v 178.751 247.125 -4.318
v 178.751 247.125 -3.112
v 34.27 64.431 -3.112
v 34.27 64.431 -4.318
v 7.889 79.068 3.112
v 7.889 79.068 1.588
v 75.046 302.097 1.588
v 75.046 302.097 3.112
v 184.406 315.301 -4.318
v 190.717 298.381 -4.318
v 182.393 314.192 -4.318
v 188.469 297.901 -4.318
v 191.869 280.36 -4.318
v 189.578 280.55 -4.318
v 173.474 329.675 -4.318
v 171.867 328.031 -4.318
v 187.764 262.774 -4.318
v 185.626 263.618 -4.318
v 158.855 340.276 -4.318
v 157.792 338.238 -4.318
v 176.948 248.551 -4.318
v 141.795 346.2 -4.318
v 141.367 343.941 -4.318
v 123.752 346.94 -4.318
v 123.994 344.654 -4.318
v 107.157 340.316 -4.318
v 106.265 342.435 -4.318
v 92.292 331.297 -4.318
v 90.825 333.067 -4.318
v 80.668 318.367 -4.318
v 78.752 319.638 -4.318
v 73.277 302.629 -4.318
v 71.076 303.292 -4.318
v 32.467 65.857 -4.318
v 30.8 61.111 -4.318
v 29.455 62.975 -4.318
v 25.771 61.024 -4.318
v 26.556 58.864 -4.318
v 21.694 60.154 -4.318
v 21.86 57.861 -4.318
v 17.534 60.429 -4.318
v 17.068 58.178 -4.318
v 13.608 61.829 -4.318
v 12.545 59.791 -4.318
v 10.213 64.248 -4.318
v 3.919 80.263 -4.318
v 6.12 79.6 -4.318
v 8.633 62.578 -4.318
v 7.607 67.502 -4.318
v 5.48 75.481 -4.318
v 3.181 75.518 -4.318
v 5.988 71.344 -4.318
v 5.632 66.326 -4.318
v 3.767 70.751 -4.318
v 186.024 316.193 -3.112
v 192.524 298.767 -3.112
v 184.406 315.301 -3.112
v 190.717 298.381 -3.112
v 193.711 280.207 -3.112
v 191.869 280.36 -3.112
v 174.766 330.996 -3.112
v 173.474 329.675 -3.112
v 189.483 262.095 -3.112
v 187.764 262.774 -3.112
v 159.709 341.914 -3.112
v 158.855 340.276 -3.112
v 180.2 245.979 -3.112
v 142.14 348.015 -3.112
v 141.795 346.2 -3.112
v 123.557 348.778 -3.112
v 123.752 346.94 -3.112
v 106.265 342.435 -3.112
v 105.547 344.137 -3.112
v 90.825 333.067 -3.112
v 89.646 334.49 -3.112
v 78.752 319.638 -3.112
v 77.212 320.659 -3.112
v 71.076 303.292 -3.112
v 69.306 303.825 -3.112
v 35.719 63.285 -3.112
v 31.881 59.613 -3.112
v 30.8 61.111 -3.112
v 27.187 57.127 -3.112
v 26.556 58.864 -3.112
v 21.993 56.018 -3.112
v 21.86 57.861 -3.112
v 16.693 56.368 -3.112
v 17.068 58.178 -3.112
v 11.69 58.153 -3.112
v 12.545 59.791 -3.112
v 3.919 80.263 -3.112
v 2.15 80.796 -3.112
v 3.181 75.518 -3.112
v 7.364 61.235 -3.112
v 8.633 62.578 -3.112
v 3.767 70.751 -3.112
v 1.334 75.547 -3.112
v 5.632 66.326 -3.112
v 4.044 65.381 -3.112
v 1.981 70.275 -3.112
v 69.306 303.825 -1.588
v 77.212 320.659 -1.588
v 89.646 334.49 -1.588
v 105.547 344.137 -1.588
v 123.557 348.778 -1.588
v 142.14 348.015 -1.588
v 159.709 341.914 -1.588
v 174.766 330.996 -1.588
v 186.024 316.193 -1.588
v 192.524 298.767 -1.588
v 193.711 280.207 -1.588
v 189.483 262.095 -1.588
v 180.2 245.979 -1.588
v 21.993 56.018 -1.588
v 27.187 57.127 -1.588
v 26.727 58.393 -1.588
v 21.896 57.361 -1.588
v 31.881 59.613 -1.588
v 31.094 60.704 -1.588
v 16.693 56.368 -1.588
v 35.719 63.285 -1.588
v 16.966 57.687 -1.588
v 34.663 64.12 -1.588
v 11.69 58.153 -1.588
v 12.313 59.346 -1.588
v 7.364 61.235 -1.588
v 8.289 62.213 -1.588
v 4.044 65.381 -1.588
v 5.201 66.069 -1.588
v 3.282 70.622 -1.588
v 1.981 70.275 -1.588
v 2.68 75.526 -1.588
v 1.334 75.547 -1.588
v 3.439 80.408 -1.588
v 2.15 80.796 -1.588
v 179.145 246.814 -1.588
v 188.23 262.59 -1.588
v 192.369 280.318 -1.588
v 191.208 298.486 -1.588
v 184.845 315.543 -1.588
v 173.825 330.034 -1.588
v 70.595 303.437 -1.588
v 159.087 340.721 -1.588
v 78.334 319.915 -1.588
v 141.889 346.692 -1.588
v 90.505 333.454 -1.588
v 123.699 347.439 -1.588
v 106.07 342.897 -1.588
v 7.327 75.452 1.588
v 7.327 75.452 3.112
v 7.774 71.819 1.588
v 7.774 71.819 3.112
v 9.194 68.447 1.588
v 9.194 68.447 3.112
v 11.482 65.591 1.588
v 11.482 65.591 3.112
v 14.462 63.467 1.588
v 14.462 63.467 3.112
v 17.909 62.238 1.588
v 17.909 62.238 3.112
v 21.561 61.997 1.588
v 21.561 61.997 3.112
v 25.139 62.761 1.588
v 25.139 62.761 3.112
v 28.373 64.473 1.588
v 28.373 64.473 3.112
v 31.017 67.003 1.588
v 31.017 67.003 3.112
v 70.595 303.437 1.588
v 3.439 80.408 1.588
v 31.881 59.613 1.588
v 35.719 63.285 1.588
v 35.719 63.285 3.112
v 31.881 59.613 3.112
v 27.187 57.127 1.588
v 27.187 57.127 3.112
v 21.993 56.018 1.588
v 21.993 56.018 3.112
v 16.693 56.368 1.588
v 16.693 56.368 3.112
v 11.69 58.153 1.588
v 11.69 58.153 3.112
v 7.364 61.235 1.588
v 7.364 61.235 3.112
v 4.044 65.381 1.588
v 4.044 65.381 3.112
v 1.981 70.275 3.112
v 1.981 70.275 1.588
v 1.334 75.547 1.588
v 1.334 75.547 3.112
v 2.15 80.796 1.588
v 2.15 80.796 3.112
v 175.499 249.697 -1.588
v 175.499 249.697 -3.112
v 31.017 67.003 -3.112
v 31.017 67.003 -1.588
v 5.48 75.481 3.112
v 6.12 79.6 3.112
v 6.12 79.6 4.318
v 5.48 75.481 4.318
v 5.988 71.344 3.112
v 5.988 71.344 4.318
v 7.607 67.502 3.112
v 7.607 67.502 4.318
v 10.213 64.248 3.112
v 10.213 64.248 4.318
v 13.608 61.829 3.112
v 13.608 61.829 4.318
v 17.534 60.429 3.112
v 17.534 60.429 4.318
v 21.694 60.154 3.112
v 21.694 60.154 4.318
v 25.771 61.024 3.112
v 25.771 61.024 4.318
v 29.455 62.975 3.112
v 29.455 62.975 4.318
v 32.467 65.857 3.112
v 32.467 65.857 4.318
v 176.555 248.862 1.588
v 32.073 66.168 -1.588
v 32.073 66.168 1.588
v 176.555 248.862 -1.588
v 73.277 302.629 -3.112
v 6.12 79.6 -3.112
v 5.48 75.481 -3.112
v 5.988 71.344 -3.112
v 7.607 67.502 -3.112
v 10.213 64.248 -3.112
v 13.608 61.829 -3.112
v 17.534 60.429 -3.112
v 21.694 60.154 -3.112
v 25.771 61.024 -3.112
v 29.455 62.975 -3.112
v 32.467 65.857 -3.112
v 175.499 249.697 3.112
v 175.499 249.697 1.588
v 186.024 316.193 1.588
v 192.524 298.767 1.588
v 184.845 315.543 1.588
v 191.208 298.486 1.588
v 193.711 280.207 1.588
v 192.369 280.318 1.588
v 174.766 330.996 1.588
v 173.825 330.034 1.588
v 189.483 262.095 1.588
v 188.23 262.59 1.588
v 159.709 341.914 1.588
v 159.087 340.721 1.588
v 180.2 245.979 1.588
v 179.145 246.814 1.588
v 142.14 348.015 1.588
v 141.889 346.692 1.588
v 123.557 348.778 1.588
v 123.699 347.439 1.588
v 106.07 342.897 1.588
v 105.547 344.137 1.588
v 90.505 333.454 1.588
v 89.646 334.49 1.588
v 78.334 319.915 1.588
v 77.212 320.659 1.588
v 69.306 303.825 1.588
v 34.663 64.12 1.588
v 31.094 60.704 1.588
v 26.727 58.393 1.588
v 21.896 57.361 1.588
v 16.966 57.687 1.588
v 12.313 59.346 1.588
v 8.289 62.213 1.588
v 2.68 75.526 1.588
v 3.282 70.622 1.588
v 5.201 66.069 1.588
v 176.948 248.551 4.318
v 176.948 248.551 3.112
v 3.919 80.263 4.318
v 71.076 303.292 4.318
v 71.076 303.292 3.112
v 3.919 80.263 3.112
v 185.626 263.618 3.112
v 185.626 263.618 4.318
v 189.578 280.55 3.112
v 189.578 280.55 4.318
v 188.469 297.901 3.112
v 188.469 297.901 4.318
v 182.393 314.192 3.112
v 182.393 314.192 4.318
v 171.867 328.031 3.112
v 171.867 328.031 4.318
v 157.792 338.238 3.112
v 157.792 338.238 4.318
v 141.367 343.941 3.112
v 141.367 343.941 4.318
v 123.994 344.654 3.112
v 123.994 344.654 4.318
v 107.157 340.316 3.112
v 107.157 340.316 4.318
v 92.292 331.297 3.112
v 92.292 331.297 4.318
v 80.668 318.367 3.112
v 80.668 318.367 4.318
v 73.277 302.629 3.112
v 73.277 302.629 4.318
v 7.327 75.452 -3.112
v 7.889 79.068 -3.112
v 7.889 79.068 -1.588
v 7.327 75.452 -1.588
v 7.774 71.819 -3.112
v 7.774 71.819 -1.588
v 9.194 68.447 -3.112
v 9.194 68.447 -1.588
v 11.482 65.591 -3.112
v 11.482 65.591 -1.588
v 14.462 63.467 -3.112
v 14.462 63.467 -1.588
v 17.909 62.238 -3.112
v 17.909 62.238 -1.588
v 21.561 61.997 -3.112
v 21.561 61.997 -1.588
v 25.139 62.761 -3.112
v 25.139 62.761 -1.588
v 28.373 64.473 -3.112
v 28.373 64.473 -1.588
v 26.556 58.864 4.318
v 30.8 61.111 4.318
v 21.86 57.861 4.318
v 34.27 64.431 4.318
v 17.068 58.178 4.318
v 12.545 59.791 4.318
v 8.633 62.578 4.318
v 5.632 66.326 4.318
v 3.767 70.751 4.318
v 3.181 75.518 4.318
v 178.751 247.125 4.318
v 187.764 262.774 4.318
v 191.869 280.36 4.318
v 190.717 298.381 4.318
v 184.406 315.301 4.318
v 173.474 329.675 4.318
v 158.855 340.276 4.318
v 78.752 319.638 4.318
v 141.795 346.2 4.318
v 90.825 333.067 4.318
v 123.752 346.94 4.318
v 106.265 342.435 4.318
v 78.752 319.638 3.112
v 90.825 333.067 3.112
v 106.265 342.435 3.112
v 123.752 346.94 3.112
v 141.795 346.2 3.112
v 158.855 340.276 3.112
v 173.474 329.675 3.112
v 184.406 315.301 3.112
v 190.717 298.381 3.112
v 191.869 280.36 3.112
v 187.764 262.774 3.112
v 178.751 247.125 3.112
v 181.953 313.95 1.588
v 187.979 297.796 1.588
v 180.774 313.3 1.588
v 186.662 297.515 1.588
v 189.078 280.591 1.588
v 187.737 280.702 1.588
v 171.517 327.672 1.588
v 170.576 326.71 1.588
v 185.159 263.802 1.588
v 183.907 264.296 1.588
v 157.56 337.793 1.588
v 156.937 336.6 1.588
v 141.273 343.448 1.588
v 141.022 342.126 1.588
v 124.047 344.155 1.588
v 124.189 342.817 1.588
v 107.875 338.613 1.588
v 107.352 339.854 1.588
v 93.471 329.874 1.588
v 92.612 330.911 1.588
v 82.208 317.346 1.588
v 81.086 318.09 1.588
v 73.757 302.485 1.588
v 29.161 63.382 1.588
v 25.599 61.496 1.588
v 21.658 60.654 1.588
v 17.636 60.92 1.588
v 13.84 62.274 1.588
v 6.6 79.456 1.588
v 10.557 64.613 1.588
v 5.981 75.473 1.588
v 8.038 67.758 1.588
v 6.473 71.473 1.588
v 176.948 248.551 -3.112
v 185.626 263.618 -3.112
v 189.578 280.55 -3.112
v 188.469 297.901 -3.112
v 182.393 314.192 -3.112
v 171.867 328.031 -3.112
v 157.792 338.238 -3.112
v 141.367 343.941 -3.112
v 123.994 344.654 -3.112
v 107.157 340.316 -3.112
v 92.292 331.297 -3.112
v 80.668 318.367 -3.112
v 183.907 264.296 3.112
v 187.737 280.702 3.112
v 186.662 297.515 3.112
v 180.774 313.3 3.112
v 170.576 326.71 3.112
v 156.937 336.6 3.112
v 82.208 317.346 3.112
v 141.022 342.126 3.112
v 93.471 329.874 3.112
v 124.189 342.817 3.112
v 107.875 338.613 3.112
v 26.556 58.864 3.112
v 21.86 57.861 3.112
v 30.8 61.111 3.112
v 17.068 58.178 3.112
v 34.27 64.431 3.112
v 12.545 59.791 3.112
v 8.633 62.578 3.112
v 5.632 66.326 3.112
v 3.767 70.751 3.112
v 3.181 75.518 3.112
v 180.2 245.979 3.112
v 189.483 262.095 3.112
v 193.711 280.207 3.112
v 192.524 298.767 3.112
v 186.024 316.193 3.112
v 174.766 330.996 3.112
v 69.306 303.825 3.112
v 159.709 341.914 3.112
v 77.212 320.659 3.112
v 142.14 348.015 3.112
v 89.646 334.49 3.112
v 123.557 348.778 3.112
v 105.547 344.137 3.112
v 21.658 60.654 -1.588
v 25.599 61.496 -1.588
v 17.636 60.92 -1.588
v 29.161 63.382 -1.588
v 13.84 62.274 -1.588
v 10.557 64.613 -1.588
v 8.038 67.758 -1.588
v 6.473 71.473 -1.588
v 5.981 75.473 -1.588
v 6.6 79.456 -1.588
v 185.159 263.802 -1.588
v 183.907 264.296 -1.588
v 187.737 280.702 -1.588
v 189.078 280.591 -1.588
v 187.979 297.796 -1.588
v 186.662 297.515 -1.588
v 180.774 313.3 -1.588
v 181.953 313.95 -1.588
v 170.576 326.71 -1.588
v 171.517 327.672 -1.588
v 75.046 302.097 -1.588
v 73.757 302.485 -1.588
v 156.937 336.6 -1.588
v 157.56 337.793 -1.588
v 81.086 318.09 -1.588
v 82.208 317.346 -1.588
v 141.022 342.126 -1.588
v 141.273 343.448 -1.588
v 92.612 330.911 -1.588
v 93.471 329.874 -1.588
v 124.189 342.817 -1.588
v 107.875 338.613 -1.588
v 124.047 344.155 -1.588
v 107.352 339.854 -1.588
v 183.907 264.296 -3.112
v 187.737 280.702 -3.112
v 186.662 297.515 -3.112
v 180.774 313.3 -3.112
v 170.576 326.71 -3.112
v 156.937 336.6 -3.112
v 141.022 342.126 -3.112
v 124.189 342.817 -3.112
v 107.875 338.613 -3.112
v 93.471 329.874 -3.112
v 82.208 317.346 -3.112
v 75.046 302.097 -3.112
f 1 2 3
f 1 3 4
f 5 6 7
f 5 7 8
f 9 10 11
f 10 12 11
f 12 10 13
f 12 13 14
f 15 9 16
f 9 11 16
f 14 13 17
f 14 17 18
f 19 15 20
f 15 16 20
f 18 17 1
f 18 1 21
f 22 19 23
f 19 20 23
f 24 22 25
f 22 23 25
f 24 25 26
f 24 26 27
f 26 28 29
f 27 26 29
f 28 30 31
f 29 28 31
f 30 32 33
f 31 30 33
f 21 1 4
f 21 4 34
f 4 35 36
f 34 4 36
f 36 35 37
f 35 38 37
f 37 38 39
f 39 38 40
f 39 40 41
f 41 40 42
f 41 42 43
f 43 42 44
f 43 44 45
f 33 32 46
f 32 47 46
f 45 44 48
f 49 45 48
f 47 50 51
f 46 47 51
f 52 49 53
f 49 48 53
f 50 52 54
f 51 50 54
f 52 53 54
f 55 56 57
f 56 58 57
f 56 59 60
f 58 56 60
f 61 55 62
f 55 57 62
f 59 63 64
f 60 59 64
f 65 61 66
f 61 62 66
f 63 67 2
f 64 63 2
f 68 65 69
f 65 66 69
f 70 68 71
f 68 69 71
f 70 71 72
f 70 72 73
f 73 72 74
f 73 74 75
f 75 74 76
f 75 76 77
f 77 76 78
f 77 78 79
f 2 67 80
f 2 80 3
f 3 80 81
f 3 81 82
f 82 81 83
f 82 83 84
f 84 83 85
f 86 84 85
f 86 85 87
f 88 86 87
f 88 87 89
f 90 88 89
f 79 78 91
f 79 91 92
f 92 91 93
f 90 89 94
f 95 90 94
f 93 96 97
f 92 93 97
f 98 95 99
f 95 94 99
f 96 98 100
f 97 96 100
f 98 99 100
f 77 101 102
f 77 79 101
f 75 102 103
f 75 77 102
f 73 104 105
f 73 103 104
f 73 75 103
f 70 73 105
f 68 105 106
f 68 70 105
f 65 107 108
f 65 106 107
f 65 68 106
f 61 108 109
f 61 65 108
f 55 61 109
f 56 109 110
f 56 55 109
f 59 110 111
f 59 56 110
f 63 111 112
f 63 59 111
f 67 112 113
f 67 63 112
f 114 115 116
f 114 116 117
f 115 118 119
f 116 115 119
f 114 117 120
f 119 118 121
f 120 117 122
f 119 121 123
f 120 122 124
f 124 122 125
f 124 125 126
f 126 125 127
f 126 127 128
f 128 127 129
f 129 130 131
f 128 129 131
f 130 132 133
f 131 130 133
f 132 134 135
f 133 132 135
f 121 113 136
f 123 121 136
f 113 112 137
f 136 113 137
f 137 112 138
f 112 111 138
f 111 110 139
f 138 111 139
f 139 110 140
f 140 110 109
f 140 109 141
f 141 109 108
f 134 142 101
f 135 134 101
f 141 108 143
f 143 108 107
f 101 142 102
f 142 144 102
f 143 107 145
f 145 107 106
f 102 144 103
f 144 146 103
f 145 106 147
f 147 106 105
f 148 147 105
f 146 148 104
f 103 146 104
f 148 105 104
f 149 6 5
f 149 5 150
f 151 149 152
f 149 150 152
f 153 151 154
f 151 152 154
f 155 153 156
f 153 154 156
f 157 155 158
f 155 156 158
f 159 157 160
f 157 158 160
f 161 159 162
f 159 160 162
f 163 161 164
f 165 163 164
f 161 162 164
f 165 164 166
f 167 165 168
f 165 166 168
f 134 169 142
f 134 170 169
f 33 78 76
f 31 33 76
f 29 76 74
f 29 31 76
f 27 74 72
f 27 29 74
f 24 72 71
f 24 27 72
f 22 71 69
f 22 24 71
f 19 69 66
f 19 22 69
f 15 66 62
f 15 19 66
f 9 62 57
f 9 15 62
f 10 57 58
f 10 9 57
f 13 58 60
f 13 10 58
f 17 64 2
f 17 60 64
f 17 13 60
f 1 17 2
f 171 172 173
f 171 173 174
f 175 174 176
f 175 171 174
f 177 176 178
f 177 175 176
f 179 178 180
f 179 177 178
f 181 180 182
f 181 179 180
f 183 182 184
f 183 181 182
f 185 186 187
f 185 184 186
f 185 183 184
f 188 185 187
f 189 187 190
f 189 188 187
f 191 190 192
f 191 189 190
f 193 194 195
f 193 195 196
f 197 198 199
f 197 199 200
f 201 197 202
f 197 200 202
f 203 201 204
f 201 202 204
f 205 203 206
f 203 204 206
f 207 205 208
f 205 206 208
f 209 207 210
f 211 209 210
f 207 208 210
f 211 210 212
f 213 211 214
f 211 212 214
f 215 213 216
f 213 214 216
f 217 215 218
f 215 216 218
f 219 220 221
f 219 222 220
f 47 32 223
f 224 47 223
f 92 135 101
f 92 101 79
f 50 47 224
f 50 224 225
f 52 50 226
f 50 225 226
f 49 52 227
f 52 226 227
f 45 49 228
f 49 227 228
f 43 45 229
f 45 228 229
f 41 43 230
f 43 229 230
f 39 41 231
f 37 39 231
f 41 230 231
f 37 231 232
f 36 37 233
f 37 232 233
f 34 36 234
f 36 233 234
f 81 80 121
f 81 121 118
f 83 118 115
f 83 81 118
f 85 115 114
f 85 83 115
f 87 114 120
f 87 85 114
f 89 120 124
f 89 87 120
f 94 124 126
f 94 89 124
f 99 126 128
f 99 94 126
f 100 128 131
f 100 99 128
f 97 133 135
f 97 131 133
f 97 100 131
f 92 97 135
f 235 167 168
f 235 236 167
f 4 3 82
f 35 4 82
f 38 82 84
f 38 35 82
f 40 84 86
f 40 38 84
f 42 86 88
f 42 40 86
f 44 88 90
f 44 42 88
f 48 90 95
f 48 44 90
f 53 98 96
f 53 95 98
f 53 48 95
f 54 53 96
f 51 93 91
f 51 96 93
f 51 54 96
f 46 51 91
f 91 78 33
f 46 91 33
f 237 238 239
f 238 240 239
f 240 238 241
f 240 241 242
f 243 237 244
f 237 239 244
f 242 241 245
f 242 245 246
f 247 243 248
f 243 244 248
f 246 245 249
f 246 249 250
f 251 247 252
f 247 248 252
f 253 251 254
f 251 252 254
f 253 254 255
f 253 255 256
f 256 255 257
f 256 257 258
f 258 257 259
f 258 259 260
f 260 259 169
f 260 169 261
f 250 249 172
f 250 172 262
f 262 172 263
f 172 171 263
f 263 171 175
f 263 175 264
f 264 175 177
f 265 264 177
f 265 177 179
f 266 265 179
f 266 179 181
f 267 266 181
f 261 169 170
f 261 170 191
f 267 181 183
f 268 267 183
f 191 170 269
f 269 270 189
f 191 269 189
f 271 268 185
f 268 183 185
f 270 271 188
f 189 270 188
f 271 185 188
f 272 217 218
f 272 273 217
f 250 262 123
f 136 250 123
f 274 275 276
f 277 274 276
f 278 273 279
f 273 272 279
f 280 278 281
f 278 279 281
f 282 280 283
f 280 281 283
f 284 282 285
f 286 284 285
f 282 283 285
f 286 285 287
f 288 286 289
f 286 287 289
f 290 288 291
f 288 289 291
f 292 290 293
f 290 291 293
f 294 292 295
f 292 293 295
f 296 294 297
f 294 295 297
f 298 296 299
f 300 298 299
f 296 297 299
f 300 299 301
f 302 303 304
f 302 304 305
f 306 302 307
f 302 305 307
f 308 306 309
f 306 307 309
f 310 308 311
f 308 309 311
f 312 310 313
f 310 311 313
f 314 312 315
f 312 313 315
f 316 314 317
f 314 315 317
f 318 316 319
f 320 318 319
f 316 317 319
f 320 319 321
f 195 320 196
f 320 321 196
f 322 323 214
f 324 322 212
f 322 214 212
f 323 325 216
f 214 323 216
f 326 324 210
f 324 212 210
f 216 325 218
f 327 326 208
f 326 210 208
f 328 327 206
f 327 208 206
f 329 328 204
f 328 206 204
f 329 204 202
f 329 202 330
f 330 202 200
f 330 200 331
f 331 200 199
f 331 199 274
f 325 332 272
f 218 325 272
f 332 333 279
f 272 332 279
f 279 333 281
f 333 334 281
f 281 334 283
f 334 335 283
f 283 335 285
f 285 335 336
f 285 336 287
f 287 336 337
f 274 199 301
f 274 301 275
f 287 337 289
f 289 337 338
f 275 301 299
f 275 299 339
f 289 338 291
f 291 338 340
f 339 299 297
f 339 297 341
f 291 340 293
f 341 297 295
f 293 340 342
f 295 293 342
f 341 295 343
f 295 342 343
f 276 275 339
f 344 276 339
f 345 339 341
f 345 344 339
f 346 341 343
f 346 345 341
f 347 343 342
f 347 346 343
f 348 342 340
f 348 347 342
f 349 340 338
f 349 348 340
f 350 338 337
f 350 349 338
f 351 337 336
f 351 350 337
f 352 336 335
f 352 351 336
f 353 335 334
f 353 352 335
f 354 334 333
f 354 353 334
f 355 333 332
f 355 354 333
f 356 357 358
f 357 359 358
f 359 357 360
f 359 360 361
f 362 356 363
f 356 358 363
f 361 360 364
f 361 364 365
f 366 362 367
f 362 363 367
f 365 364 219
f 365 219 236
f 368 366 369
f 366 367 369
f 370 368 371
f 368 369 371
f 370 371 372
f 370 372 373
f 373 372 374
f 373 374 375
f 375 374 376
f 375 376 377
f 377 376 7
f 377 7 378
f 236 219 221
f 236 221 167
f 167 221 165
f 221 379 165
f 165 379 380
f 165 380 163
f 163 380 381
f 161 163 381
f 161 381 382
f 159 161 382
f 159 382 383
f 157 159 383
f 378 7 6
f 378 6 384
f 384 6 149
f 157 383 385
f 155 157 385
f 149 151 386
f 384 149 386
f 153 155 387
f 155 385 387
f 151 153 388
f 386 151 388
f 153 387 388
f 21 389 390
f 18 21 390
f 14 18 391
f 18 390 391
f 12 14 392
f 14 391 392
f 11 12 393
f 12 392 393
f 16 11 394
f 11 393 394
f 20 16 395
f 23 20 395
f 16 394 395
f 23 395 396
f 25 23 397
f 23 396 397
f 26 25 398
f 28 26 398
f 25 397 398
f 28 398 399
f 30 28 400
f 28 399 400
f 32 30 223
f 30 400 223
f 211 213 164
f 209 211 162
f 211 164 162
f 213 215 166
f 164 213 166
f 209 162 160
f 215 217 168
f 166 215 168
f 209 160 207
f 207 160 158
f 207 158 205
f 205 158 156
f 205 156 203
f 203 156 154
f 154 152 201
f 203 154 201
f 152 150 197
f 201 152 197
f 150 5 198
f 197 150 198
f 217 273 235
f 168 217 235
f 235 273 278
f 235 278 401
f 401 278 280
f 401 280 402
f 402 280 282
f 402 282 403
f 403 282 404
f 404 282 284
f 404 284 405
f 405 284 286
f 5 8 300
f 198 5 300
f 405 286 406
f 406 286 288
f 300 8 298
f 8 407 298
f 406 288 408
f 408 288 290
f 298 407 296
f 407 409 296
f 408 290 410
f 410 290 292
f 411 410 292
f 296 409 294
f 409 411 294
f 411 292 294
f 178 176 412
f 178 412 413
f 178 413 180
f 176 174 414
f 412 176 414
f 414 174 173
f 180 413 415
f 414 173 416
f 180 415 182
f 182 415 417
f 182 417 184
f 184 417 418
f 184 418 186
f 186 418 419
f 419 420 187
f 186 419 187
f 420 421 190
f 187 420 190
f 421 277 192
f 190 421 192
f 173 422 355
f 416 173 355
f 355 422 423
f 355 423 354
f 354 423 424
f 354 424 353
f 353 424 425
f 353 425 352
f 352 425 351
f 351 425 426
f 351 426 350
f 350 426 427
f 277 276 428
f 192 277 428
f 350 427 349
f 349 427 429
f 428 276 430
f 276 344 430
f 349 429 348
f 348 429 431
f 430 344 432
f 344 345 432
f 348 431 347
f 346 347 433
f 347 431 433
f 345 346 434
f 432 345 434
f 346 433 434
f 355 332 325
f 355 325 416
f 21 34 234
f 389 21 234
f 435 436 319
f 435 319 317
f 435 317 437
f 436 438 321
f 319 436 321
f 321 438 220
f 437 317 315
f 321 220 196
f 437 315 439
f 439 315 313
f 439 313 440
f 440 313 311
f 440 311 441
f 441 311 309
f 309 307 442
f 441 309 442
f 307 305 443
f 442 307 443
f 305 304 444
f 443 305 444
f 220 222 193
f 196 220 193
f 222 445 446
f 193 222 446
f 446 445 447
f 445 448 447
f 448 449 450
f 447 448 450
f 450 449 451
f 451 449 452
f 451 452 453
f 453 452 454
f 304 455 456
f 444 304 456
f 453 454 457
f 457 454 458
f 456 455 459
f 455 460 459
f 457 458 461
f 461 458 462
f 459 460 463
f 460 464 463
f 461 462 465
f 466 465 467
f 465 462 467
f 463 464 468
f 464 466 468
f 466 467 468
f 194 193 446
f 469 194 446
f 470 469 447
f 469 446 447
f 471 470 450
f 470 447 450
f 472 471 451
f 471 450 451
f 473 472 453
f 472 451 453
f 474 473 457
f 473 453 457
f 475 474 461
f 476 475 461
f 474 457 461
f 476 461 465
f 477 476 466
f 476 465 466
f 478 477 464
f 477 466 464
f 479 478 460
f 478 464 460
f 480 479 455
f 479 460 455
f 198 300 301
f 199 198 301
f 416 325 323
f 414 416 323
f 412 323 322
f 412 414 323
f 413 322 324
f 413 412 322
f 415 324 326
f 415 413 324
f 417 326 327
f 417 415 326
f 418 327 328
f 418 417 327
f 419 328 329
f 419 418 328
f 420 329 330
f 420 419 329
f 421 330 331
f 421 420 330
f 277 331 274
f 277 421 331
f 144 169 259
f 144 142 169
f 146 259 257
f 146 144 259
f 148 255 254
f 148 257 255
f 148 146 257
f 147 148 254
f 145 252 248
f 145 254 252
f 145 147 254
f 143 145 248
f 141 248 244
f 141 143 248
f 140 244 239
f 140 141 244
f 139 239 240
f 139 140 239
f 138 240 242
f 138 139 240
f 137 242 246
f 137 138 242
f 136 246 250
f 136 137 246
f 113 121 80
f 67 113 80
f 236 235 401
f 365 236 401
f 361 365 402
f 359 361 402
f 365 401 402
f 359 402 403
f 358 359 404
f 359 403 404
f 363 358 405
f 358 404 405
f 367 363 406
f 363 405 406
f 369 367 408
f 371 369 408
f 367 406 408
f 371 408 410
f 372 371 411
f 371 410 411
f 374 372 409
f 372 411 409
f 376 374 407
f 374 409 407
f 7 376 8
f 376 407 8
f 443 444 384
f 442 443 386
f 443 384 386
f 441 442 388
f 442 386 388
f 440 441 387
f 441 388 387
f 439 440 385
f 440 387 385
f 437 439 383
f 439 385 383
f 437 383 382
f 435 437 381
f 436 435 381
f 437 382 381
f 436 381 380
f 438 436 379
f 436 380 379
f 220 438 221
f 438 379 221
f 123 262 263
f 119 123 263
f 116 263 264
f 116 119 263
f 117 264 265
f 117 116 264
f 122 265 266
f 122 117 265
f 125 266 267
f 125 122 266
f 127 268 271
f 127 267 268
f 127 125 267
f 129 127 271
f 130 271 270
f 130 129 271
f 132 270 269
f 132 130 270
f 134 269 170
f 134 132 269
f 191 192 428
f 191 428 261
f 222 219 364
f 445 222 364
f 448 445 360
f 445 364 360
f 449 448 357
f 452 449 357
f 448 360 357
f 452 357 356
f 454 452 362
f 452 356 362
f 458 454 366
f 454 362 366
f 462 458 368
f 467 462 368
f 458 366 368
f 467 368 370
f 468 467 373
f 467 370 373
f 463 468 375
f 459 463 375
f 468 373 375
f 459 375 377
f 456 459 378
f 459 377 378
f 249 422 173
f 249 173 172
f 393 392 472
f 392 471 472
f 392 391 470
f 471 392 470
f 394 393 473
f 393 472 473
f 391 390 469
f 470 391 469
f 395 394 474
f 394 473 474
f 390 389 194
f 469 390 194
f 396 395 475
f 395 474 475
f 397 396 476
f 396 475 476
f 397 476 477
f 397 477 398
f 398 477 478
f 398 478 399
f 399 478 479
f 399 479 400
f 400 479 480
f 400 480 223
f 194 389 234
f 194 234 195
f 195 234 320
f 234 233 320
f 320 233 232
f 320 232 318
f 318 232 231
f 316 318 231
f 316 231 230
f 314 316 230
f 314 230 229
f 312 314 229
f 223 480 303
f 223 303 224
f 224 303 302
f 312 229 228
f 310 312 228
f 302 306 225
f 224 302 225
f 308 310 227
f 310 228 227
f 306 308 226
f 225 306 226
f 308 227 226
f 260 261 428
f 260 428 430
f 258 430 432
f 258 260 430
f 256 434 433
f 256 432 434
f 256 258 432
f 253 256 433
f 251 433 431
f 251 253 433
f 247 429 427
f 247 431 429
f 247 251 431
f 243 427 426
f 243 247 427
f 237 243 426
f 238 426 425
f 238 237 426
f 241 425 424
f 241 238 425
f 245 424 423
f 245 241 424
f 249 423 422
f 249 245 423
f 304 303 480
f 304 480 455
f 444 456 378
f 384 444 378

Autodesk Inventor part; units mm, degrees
ref_plane "Work Plane2" through (20.602935, 75.239361, 0) normal (-1, 0, 0) x (0, 0, 1)
ref_plane "Work Plane3" through (130.265709, 285.46929, 0) normal (-0.3453892, -0.9384595, 0) x (0, 0, 1)
sketch "Path" plane through (0, 0, 0) normal (0, 0, 1) x (1, 0, 0)
  arc A0 (5.019556, 79.931703) -> (33.368035, 65.144213) centre (20.602935, 75.239361) ccw
  arc A1 (177.849583, 247.838078) -> (72.176269, 302.960718) centre (130.265709, 285.46929) ccw
  line L0 (177.849583, 247.838078) -> (33.368035, 65.144213)
  line L1 (5.019556, 79.931703) -> (72.176269, 302.960718)
  dimension "d31" = 5.9944
ref_plane "Section Plane" through (33.368035, 65.144213, 0) normal (0.6203041, 0.7843614, 0) x (0, 0, 1)
sketch "Section Sketch" plane through (33.368035, 65.144213, 0) normal (0.6203041, 0.7843614, 0) x (0, 0, 1)
  line L0 (-4.318, -1.14935) -> (4.318, -1.14935)
  line L1 (4.318, -1.14935) -> (4.318, 1.14935)
  line L2 (4.318, 1.14935) -> (-4.318, 1.14935)
  line L3 (-4.318, 1.14935) -> (-4.318, -1.14935)
  line L4 (-1.5875, -1.651) -> (1.5875, -1.651)
  line L5 (1.5875, -1.651) -> (1.5875, 1.651)
  line L6 (1.5875, 1.651) -> (-1.5875, 1.651)
  line L7 (-1.5875, 1.651) -> (-1.5875, -1.651)
  line L8 (-1.5875, 0) -> (1.5875, 0) construction
  line L9 (-3.1115, -2.9972) -> (-1.5875, -2.9972)
  line L10 (-1.5875, -2.9972) -> (-1.5875, 2.9972)
  line L11 (-1.5875, 2.9972) -> (-3.1115, 2.9972)
  line L12 (-3.1115, 2.9972) -> (-3.1115, -2.9972)
  line L13 (1.5875, -2.9972) -> (3.1115, -2.9972)
  line L14 (3.1115, -2.9972) -> (3.1115, 2.9972)
  line L15 (3.1115, 2.9972) -> (1.5875, 2.9972)
  line L16 (1.5875, 2.9972) -> (1.5875, -2.9972)
  line L17 (-4.318, 0) -> (4.318, 0) construction
  point P0 (0, 0)
  point P1 (0, 0)
  dimension "d21" = 2.2987
  dimension "d22" = 3.302
  dimension "d23" = 3.175
  dimension "d24" = 1.524
  dimension "d31" = 5.9944
  dimension "d32" = 8.636
sweep "Solid" add profiles "Section Sketch" path "Path"
pattern_of_one "Strand Pattern"
equation "\"d21\" = da_d2"
equation "\"d22\" = da_d1"
equation "\"d23\" = da_b1"
equation "\"d24\" = da_t1 + da_t2"
equation "\"d30\" = da_pt"
equation "\"da_p\" = 6.35"
equation "\"da_b1\" = 3.175"
equation "\"da_h2\" = 5.9944"
equation "\"da_h3\" = 5.207"
equation "\"da_d1\" = 3.302"
equation "\"da_d2\" = 2.2987"
equation "\"da_pt\" = 6.4008"
equation "\"da_b\" = 8.636"
equation "\"da_t1\" = 0.762"
equation "\"da_t2\" = 0.762"
properties part number "Roller Chain"
